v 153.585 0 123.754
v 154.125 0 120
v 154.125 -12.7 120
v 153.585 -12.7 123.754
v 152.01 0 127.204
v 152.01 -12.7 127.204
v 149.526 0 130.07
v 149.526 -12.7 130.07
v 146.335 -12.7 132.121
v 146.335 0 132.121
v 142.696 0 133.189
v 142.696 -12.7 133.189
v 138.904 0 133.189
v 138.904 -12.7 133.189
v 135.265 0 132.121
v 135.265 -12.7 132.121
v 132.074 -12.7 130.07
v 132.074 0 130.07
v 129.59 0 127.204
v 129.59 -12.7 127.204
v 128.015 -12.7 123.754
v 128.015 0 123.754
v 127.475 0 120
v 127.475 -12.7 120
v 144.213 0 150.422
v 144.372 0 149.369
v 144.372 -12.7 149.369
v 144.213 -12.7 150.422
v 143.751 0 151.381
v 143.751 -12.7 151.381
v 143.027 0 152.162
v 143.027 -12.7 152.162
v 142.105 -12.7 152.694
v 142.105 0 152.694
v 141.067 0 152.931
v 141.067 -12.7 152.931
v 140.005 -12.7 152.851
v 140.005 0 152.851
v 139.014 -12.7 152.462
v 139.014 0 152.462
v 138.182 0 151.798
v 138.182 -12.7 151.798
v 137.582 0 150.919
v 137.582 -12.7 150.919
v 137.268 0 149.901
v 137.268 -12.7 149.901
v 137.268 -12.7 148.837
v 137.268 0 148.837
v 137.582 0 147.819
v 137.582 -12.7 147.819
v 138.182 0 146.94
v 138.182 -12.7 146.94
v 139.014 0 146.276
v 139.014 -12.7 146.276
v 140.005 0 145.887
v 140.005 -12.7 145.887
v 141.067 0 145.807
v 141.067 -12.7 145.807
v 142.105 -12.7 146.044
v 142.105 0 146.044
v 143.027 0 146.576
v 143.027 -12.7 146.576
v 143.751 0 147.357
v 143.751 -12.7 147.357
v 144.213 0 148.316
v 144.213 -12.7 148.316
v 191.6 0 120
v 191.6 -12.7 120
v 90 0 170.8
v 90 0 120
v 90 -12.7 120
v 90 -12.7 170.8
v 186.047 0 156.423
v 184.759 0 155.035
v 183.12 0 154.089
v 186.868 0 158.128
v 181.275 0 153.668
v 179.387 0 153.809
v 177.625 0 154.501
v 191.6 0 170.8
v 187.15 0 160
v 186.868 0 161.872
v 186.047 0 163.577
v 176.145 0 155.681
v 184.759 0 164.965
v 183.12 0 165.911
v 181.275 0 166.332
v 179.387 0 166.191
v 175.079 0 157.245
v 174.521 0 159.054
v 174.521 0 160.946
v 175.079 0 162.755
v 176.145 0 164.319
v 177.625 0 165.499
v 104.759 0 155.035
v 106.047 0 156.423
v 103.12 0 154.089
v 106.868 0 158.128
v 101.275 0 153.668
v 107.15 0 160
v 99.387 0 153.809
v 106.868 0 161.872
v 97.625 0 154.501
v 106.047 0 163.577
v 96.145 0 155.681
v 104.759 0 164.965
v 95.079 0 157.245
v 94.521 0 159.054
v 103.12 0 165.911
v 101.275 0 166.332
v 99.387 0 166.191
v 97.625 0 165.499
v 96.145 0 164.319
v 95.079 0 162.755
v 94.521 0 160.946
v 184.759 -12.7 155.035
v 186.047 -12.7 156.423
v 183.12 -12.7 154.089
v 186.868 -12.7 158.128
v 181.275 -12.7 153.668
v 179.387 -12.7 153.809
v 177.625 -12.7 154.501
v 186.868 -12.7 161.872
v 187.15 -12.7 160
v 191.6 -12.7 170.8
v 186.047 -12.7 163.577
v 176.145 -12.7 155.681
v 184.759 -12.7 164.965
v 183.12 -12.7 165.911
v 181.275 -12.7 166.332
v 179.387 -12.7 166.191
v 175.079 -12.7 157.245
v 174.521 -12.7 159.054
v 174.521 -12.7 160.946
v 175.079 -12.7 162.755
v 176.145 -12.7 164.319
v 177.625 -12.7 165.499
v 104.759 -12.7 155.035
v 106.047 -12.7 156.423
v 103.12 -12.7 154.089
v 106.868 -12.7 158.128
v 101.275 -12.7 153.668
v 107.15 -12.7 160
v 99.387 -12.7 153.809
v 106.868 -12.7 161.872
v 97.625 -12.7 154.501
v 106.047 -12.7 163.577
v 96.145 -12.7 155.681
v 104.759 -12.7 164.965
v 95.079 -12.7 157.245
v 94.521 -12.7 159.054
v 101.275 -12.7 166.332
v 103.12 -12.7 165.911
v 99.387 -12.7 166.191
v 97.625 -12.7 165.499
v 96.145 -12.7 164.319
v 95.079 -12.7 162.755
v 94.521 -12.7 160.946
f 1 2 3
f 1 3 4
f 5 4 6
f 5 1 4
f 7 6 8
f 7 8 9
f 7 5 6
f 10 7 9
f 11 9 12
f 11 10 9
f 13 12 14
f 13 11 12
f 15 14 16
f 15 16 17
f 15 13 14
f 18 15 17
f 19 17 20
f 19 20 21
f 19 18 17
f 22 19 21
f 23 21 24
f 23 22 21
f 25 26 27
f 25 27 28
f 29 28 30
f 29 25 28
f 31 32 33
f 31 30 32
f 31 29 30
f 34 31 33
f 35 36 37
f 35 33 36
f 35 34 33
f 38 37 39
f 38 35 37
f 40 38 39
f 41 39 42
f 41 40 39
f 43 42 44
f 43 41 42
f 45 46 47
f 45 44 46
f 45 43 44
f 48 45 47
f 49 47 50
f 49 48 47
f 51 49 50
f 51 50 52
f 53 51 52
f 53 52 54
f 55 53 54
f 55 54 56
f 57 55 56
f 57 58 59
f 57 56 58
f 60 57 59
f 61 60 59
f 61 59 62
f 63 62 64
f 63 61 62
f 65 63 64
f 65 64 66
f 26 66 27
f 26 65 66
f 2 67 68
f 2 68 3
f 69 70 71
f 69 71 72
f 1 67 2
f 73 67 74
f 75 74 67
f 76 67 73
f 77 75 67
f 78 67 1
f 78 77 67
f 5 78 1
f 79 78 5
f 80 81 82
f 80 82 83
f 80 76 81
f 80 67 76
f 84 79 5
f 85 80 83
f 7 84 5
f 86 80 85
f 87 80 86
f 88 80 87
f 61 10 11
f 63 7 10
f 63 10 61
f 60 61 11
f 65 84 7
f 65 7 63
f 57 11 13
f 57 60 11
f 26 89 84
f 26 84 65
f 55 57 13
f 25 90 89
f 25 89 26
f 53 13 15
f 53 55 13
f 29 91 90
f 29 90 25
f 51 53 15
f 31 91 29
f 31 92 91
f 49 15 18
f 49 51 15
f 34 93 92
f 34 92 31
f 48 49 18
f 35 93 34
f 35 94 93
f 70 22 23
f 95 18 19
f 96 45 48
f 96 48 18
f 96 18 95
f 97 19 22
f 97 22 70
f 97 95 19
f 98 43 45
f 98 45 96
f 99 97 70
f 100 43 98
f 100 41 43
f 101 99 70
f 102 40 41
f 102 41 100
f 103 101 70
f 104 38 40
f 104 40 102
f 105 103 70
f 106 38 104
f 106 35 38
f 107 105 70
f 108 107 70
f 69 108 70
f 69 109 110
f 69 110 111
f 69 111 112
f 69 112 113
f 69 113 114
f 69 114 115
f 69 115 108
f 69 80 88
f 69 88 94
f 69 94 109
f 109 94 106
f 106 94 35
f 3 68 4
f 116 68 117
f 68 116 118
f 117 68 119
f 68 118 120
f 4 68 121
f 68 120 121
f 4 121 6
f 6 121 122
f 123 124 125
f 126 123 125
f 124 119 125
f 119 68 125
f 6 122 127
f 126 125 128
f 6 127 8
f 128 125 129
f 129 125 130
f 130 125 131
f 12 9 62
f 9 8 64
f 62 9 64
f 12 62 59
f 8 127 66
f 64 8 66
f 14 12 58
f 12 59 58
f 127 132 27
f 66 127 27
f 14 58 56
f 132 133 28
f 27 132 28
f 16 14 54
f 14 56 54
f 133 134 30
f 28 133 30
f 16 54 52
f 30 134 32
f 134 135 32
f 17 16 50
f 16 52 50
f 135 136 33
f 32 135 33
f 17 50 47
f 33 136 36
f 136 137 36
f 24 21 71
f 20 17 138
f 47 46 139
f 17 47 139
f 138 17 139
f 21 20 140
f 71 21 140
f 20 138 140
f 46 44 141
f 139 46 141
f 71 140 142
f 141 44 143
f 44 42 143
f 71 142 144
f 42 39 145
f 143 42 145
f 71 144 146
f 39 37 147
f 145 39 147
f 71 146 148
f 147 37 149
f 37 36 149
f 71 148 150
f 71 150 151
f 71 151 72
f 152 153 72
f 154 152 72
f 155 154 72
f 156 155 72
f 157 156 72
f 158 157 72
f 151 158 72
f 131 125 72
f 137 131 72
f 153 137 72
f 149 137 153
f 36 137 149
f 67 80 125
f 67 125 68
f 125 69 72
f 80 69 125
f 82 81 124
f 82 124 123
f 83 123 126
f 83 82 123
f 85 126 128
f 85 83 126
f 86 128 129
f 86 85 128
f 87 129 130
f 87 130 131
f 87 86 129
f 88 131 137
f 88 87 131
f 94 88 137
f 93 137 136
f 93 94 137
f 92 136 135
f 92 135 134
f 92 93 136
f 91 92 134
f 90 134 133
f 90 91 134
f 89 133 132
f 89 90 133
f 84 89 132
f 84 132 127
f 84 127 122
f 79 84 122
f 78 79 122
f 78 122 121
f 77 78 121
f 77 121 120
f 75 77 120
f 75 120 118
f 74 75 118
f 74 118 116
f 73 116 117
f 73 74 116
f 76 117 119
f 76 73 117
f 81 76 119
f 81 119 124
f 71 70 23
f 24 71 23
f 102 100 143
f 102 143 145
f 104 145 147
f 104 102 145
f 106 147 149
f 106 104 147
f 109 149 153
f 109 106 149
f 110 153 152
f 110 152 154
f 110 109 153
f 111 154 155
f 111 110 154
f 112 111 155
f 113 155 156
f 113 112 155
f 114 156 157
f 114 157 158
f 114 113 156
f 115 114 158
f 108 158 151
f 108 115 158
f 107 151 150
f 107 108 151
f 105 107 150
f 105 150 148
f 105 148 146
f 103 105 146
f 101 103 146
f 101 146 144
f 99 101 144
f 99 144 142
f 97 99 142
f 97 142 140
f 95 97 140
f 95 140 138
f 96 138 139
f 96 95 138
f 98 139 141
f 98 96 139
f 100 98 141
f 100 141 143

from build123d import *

# Parameters (mm, degrees)
SKETCH057_R  = 3.571875
PAD057_DEPTH = 30
SKETCH056_R  = 6.35
PAD056_DEPTH = 12.7


with BuildPart() as body056:
    # Sketch057 → Pad057 (new body)
    with BuildSketch(Plane.XZ):
        Circle(SKETCH057_R)
    extrude(amount=PAD057_DEPTH)


with BuildPart() as body056_1:
    # Body056 placement: moved
    add(body056.part.moved(Location((41.6, 2, 149.369))))


with BuildPart() as cut048:
    # Sketch056 → Pad056 (new body)
    with BuildSketch(Plane.XZ):
        with BuildLine():
            Line((-50.8, 110), (-50.8, 160.8))
            Line((-50.8, 160.8), (50.8, 160.8))
            Line((50.8, 160.8), (50.8, 110))
            Line((50.8, 110), (13.325, 110))
            ThreePointArc((13.325, 110), (0, 123.324965), (-13.325, 110))
            Line((-50.8, 110), (-13.325, 110))
        make_face()
        with Locations((-40, 150)):
            Circle(SKETCH056_R, mode=Mode.SUBTRACT)
        with Locations((40, 150)):
            Circle(SKETCH056_R, mode=Mode.SUBTRACT)
    extrude(amount=PAD056_DEPTH)


with BuildPart() as cut048_1:
    # Body057 placement: moved
    add(cut048.part.moved(Location((41.6, 0, 10))))

    # Cut048: cut Body056
    add(body056_1.part, mode=Mode.SUBTRACT)


with BuildPart() as cut048_2:
    # Cut048 placement: moved
    add(cut048_1.part.moved(Location((99.2, 0, 0))))


solid = cut048_2.part
